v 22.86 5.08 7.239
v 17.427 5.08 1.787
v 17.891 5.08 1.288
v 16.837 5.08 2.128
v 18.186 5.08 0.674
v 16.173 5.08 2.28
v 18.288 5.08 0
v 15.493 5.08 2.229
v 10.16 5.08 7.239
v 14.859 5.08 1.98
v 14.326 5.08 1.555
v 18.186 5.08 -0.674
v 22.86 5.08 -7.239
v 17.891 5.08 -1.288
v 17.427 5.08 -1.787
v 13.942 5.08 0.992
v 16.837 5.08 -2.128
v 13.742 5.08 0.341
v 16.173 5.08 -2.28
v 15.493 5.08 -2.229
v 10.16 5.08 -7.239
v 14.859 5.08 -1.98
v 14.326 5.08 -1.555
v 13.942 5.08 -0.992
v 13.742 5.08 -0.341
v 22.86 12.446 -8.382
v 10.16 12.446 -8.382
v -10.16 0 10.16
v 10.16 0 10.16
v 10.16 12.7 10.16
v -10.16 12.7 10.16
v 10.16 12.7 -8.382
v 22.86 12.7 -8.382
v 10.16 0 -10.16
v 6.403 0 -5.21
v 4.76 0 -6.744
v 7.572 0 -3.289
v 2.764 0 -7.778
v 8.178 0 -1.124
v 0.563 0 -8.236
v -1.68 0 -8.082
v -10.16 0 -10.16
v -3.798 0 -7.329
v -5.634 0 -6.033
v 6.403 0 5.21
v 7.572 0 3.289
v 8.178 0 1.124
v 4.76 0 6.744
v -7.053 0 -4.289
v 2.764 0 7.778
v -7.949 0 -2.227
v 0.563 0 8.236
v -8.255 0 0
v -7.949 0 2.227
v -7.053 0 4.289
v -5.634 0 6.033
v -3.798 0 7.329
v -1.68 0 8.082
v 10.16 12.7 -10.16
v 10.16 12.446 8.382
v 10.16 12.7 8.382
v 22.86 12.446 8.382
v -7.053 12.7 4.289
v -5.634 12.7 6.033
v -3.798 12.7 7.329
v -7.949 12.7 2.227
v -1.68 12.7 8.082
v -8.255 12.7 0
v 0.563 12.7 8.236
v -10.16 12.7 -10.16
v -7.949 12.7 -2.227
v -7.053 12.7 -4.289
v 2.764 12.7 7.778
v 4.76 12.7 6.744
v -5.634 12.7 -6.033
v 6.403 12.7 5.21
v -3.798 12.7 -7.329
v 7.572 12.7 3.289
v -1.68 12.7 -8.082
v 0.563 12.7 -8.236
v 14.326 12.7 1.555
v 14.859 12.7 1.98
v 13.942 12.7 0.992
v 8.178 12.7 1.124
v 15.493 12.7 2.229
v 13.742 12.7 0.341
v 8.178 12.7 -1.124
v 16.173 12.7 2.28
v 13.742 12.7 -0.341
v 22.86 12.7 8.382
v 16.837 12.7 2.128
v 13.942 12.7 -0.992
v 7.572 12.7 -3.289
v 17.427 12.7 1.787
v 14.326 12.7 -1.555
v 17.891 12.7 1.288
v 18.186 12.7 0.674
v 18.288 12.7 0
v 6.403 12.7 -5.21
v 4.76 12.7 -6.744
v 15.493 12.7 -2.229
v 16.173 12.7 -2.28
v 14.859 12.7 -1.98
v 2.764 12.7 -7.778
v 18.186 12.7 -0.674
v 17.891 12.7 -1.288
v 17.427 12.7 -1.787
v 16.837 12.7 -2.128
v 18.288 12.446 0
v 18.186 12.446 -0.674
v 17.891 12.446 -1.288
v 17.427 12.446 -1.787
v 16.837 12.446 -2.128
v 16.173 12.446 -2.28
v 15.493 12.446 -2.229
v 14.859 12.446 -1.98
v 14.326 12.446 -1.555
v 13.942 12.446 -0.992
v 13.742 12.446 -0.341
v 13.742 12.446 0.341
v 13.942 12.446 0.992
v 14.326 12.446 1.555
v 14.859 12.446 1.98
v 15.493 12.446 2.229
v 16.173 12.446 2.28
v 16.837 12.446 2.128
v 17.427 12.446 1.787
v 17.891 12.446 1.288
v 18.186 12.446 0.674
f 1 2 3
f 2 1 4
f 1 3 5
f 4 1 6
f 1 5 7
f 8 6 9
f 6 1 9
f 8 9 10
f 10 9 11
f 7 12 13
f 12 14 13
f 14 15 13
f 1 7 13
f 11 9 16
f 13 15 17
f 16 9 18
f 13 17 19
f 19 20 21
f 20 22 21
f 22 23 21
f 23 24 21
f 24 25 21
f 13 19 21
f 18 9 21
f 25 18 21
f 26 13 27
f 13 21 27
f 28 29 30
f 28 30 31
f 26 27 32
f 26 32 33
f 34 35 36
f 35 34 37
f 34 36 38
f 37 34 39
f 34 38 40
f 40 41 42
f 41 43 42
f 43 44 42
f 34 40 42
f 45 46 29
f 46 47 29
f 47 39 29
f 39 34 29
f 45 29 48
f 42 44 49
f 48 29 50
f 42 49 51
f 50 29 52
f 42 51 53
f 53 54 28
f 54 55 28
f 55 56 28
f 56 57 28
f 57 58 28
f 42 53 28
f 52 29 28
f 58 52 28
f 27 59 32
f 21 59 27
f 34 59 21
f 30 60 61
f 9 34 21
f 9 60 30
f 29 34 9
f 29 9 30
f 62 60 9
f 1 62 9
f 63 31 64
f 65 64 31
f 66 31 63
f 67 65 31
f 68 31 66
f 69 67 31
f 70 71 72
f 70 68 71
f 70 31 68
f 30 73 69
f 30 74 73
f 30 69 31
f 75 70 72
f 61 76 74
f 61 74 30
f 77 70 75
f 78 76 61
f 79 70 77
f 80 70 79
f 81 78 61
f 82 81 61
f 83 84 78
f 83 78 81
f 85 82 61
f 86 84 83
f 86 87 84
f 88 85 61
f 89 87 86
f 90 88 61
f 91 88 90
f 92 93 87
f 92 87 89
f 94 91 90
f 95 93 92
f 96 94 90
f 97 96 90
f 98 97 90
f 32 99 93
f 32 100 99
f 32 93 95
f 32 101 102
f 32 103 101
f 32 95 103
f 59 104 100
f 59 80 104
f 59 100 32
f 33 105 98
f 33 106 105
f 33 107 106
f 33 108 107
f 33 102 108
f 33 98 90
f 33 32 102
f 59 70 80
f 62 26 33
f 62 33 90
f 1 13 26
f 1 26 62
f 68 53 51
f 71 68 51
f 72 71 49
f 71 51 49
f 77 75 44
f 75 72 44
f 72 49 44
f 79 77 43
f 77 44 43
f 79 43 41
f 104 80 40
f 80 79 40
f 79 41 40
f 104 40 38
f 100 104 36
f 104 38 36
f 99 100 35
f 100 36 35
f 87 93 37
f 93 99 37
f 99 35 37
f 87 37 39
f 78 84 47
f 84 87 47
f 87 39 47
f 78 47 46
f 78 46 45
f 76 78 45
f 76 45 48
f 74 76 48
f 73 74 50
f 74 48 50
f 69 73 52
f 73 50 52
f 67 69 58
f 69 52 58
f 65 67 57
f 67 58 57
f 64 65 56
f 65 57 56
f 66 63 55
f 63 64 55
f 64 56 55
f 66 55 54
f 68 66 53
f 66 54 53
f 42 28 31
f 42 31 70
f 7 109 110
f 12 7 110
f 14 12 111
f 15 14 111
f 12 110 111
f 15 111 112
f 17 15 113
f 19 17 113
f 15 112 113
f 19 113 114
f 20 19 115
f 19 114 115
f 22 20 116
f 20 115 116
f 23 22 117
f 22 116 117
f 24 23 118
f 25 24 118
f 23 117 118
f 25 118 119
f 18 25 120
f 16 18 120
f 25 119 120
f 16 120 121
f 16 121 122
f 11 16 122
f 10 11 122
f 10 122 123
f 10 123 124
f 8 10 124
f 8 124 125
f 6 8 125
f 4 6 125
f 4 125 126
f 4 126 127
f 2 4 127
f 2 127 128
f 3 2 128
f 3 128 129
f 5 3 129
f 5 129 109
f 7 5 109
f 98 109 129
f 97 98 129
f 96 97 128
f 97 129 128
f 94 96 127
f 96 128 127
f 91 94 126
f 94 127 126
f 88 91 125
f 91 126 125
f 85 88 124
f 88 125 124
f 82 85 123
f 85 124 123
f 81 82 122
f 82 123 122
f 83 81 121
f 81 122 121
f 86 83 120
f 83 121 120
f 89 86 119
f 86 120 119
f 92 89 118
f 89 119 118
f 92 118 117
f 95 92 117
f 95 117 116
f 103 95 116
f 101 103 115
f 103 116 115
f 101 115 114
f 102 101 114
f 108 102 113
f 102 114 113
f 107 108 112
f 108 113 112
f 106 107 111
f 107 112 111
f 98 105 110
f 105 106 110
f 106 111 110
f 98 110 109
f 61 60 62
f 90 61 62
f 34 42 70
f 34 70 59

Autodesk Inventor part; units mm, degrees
ref_plane "YZ Plane" through (0, 0, 0) normal (1, 0, 0) x (0, 1, 0)
ref_plane "XZ Plane" through (0, 0, 0) normal (0, 1, 0) x (-1, 0, 0)
ref_plane "XY Plane" through (0, 0, 0) normal (0, 0, 1) x (1, 0, 0)
sketch "Sketch1" plane through (0, 0, 0) normal (0, 1, 0) x (-1, 0, 0)
  line L0 (-10.16, 10.16) -> (10.16, 10.16)
  line L1 (10.16, 10.16) -> (10.16, -10.16)
  line L2 (10.16, -10.16) -> (-10.16, -10.16)
  line L3 (-10.16, -10.16) -> (-10.16, 10.16)
  circle A0 centre (0, 0) radius 8.255
  dimension "d0" = 20.32
  dimension "d1" = 20.32
  dimension "d2" = 10.16
  dimension "d3" = 10.16
  dimension "d4" = 16.51
extrude "Extrusion1" add sketch "Sketch1" along normal blind 12.7
sketch "Sketch2" plane through (10.16, 0, 10.16) normal (1, 0, 0) x (0, 0, -1)
  line L0 (1.778, 12.446) -> (2.921, 5.08)
  line L1 (2.921, 5.08) -> (17.399, 5.08)
  line L2 (17.399, 5.08) -> (18.542, 12.446)
  line L3 (18.542, 12.446) -> (1.778, 12.446)
  line L4 (20.32, 0) -> (0, 0) projected
  line L5 (20.32, 0) -> (20.32, 12.7) projected
  point P0 (10.16, 0)
  dimension "d7" = 16.764
  dimension "d8" = 14.478
  dimension "d9" = 7.366
  dimension "d10" = 5.08
  dimension "d11" = 2.921
extrude "Extrusion2" add sketch "Sketch2" along normal blind 12.7
sketch "Sketch3" plane through (10.16, 12.446, 8.382) normal (0, 1, 0) x (1, 0, 0)
  circle A0 centre (5.842, 8.382) radius 2.286
  line L0 (12.7, 16.764) -> (12.7, 0) projected
  point P0 (-10.16, 8.382)
  dimension "d14" = 4.572
  dimension "d15" = 6.858
extrude "Extrusion3" cut sketch "Sketch3" against normal blind 17.78
sketch "Sketch4" plane through (10.16, 12.446, 8.382) normal (0, 1, 0) x (1, 0, 0)
  circle A0 centre (5.842, 8.382) radius 2.286 projected
  line L0 (0, 0) -> (0, 16.764) projected
  line L1 (0, 0) -> (12.7, 0) projected
  line L2 (12.7, 16.764) -> (12.7, 0) projected
  line L3 (0, 16.764) -> (12.7, 16.764) projected
  point P0 (-10.16, 8.382)
extrude "Extrusion4" add sketch "Sketch4" along normal up to surface (0.254 mm away)
properties part number "HopperFinal2"
